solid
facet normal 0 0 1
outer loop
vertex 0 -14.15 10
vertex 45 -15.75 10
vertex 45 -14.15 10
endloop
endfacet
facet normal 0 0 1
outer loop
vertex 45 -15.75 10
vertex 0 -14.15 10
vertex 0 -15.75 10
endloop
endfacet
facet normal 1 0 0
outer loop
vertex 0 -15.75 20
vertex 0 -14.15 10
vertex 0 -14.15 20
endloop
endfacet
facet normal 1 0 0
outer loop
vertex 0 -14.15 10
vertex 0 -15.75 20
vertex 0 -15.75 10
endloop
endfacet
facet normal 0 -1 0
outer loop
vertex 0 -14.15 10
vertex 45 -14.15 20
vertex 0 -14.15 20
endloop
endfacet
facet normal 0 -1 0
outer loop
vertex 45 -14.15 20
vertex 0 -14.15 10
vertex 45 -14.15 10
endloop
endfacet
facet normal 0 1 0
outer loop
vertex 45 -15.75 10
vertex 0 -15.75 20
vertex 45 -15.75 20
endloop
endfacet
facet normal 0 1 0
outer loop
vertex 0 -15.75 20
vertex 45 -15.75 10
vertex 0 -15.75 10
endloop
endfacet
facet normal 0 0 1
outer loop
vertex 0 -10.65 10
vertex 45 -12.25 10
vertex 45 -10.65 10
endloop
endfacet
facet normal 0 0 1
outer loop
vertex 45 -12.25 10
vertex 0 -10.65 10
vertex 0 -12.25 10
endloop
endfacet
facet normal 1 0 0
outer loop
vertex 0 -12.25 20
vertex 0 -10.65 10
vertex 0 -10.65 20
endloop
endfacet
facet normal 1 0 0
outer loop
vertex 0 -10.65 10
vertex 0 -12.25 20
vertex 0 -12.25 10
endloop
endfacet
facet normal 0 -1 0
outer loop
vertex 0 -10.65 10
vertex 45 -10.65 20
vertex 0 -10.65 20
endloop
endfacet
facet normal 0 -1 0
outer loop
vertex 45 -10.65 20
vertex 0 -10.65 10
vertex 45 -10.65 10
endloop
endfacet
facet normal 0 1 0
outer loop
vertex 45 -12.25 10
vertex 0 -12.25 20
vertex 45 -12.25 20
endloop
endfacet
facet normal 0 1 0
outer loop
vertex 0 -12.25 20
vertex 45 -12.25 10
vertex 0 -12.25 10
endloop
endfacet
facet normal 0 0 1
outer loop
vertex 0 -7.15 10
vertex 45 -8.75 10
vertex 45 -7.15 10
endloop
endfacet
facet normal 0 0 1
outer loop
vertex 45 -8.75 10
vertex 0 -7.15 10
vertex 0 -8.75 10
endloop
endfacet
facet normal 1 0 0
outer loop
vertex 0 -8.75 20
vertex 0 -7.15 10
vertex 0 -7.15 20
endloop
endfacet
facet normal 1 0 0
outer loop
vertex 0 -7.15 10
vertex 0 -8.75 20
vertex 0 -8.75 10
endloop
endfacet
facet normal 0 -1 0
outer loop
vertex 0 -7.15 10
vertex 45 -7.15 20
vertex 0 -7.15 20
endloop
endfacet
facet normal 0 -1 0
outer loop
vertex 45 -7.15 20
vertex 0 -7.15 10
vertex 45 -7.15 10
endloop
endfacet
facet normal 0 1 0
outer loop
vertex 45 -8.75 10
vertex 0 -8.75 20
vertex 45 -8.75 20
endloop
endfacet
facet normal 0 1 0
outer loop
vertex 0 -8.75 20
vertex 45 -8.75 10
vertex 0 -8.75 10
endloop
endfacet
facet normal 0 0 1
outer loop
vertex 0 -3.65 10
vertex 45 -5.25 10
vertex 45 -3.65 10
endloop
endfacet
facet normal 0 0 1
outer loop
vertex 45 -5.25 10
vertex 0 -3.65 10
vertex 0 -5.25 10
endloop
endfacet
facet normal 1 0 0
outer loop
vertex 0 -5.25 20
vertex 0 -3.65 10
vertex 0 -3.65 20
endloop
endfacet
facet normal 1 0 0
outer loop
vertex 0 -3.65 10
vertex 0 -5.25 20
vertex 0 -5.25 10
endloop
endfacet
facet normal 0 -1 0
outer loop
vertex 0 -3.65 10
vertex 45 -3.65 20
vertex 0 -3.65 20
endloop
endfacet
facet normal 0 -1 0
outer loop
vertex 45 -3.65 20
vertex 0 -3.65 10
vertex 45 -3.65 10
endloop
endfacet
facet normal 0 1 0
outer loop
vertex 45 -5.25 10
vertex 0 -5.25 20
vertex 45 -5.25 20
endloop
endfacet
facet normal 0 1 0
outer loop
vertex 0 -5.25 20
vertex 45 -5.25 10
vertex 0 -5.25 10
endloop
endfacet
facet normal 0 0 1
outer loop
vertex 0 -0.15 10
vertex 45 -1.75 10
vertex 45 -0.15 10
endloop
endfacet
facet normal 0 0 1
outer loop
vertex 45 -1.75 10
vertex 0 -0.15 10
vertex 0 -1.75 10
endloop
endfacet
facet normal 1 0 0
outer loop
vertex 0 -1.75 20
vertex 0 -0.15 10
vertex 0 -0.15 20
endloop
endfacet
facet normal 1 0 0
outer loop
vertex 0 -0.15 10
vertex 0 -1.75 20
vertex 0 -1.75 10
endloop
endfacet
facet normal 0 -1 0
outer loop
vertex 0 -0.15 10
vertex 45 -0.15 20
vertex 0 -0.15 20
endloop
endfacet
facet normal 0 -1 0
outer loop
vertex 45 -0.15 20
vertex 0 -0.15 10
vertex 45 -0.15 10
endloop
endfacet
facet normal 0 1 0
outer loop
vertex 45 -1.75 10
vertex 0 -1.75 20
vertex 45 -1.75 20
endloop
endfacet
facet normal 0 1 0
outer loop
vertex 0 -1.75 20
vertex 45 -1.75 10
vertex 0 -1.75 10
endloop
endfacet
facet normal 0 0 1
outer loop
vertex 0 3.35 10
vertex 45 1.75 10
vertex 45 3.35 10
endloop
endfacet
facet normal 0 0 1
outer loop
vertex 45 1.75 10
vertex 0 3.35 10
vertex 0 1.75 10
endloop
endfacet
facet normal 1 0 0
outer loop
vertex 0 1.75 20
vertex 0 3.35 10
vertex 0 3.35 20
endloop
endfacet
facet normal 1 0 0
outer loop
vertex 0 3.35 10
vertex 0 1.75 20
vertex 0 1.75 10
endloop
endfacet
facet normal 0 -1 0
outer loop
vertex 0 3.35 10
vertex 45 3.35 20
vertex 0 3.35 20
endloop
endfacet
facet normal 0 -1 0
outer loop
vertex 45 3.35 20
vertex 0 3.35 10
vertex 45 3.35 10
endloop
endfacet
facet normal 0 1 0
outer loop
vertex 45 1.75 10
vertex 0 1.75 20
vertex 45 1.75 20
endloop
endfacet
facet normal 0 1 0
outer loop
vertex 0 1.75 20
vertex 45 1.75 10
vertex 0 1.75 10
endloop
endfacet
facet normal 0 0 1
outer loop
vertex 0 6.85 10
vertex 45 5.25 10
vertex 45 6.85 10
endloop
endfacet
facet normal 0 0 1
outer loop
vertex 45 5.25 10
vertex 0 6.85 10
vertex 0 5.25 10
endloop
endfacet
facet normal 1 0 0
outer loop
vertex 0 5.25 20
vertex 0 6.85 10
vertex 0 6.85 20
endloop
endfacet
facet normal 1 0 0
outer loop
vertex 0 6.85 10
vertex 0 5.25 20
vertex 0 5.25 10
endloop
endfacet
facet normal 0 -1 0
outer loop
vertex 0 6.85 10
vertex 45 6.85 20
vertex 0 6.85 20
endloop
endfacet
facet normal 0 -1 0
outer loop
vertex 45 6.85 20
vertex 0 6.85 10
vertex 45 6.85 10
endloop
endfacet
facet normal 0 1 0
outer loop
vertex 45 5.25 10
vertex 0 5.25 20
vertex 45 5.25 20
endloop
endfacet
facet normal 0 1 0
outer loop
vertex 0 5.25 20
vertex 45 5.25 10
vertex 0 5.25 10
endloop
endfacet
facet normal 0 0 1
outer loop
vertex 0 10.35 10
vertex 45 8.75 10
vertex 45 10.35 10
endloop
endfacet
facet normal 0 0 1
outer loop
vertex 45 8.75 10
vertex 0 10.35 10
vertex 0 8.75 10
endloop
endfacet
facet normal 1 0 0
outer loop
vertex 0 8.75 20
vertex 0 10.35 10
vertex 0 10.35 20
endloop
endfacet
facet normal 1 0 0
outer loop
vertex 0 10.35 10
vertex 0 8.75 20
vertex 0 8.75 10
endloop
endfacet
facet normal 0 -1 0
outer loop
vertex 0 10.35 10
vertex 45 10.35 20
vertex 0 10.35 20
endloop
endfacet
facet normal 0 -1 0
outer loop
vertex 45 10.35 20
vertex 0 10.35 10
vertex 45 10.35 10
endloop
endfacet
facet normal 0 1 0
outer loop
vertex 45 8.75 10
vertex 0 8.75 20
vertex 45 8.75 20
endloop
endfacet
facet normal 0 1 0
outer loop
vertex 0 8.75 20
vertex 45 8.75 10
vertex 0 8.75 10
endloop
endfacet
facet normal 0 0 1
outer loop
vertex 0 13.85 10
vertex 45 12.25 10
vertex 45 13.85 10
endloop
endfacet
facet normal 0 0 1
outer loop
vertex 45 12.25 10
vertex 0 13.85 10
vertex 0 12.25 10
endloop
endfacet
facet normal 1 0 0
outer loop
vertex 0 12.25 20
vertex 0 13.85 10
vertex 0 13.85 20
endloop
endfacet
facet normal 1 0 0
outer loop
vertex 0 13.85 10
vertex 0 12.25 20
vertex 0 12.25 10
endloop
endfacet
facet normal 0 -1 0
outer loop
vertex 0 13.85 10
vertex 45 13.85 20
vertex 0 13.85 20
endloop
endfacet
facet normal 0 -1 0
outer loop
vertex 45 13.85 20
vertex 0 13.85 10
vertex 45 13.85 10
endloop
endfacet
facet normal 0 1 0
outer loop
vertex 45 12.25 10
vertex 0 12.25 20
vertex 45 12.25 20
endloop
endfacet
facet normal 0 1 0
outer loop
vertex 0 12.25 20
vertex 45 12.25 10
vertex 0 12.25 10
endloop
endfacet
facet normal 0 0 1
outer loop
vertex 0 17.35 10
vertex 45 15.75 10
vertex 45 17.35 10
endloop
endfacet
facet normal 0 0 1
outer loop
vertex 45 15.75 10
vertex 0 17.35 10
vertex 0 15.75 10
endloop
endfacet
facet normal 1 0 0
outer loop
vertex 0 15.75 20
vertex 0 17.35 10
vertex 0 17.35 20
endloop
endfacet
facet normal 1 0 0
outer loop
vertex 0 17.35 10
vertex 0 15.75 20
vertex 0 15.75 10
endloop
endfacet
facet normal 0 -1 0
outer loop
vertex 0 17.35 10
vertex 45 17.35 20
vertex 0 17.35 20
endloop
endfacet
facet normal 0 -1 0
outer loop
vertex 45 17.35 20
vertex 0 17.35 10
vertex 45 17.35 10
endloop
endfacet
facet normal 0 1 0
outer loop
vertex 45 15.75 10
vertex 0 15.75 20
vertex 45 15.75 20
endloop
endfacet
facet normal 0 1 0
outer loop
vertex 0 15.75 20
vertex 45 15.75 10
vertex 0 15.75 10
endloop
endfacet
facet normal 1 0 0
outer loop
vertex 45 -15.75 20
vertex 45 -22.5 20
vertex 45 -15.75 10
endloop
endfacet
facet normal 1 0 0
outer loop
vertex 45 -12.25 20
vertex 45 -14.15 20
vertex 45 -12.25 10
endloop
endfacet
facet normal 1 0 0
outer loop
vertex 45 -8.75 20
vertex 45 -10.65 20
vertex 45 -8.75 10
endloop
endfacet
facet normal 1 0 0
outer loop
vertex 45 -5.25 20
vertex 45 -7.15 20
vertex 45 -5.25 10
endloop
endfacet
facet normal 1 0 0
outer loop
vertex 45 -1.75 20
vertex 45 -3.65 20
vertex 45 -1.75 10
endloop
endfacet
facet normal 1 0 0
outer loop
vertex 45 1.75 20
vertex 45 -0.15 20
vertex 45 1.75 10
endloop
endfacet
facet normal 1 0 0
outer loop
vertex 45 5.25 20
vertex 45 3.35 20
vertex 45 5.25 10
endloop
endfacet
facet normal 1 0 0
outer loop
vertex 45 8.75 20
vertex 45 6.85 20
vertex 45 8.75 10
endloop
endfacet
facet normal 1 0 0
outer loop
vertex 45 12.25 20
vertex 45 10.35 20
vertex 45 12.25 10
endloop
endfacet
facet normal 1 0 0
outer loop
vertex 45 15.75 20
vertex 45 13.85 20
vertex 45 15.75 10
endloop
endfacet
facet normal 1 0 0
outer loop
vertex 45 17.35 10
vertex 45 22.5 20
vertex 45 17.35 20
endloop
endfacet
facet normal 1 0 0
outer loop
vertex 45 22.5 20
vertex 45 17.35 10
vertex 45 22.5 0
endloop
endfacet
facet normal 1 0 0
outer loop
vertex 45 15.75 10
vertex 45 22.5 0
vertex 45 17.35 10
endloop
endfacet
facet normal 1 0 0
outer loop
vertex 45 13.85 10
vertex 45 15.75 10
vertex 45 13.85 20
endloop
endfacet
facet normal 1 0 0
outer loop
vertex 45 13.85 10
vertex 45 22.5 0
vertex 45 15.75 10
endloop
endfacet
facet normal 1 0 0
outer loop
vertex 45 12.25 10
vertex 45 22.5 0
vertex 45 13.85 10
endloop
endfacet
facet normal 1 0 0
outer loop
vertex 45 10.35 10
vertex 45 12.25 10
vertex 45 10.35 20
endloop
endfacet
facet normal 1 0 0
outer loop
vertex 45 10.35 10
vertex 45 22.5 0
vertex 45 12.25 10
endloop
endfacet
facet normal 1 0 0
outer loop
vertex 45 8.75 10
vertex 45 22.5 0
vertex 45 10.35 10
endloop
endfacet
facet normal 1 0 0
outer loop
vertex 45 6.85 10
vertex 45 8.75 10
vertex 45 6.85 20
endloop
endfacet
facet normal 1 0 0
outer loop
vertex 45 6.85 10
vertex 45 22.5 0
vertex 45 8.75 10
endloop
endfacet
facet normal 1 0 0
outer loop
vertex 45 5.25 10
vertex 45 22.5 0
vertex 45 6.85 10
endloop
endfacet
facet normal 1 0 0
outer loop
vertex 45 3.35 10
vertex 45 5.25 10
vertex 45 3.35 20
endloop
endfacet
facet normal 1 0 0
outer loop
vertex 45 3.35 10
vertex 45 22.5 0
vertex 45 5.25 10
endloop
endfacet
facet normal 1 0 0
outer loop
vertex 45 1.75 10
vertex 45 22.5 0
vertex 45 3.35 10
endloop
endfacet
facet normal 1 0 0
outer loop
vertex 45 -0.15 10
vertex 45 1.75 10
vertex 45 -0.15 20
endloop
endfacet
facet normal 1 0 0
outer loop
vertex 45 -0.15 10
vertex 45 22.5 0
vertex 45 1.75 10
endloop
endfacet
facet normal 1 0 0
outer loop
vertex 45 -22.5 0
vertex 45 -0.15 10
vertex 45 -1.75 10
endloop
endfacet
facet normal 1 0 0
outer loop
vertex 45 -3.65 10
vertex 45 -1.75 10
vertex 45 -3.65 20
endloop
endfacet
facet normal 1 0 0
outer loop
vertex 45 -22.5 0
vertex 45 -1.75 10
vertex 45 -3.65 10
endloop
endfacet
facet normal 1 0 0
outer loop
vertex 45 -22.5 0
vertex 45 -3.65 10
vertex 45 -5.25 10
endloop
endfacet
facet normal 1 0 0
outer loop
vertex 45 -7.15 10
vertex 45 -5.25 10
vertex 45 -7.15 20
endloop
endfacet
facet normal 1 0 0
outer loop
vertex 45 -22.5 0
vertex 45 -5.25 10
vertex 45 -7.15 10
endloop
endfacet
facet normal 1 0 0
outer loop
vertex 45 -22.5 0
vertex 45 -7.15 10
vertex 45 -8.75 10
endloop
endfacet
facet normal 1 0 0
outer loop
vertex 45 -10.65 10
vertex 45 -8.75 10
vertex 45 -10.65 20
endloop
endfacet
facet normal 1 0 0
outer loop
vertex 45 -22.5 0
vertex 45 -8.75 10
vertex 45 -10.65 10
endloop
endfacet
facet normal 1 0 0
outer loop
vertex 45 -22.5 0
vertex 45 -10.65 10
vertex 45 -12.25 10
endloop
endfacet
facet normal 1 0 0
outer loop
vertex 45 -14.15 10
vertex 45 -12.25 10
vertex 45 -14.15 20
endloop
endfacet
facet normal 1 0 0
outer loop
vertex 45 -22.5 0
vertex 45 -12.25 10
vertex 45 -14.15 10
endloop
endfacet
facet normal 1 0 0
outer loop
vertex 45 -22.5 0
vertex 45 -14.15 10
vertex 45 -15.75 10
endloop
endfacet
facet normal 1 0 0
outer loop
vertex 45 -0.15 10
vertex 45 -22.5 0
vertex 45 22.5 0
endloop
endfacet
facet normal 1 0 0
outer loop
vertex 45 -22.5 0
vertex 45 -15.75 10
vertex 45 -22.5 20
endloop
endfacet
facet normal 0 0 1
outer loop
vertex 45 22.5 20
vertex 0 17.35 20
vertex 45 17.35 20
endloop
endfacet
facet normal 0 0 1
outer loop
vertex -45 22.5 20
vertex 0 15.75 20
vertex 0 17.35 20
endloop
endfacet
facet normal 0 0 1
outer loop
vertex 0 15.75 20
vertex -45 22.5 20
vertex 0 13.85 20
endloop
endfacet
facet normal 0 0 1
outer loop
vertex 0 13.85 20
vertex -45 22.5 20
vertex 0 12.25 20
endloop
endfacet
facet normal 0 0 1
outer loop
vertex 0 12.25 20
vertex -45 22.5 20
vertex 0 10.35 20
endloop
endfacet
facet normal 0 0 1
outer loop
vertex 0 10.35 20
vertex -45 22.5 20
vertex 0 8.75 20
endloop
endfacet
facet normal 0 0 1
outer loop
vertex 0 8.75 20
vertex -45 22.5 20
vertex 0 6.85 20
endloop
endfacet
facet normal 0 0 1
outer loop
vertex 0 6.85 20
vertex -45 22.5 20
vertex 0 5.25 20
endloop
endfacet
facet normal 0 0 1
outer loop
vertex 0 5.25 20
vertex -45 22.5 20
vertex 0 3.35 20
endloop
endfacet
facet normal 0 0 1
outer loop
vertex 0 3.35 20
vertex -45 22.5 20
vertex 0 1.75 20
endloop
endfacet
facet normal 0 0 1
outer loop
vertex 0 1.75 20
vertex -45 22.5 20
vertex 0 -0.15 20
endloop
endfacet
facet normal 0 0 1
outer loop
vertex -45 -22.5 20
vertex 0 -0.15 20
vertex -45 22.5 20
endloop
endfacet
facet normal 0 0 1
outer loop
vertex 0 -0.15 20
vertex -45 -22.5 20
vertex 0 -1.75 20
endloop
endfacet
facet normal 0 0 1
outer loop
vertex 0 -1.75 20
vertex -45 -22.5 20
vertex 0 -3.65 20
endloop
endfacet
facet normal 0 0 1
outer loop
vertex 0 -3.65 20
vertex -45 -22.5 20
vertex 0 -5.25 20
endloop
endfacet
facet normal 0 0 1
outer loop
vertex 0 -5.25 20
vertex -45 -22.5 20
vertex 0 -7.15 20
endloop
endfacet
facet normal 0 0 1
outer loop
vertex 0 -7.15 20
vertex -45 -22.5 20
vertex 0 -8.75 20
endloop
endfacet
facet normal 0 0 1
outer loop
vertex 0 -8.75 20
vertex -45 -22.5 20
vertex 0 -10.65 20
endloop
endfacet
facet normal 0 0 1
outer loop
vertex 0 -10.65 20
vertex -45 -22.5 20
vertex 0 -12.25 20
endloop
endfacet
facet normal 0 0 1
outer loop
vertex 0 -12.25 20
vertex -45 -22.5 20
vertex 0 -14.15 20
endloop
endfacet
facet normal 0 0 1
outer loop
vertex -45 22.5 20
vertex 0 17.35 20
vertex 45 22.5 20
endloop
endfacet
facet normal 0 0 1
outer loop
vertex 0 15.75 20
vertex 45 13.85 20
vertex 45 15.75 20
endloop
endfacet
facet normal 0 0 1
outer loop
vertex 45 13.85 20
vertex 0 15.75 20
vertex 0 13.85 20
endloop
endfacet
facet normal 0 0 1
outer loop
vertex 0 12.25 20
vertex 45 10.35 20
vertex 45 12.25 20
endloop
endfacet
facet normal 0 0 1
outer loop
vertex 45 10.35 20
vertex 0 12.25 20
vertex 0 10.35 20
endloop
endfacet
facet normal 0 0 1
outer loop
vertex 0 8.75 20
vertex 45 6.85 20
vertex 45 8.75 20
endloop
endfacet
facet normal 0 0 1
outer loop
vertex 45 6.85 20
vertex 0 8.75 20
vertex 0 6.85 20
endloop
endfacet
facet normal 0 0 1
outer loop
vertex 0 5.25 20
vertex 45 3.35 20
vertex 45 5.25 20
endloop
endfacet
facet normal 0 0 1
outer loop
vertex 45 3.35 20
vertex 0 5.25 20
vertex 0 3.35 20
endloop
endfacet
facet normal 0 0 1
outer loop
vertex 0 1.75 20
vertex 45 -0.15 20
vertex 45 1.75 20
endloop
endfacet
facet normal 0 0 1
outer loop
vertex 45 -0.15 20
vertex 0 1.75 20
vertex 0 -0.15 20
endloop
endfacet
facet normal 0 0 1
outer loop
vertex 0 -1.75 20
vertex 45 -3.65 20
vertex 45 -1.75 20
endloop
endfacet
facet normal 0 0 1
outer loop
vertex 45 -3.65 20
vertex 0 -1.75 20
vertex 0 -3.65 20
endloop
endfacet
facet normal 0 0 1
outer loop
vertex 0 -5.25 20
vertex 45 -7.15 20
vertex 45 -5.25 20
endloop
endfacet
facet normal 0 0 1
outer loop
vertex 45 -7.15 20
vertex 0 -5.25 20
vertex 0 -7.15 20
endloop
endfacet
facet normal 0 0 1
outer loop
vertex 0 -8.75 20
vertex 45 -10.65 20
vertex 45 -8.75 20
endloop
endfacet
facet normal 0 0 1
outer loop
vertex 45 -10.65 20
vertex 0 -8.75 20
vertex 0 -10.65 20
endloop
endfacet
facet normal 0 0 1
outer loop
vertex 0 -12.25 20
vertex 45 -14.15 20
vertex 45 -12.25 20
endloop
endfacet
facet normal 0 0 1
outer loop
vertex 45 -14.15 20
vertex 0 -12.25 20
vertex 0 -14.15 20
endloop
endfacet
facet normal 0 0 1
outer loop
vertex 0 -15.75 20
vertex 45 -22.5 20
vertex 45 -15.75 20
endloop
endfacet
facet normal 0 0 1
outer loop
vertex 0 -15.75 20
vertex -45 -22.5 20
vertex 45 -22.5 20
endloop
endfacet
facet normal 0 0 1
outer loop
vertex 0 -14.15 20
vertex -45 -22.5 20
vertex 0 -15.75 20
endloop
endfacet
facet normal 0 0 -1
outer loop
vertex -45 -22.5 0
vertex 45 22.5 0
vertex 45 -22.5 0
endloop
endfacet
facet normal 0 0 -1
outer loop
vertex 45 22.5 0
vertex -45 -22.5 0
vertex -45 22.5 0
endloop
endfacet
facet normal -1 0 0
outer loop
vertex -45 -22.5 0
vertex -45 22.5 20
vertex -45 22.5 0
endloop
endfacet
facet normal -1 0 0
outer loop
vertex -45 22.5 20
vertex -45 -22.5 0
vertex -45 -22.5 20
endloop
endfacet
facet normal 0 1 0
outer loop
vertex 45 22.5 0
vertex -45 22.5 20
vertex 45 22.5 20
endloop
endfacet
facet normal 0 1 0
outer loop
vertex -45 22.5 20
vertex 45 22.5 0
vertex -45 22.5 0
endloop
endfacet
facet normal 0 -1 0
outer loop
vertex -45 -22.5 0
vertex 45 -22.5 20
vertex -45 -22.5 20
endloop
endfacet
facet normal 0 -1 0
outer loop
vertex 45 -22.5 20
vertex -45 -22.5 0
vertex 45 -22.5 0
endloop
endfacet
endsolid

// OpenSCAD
// Microscope slide drying rack
// Print orientation: base block on XY plane, slots open upward (+Z)

// ---------------- Parameters ----------------
block_len    = 90;    // block length along X (mm)
block_wid    = 45;    // block width along Y (mm)
block_h      = 20;    // block height along Z (mm)

slot_count   = 10;    // number of slide slots
slot_len     = 77;    // slot length along X (mm)
slot_w       = 1.6;   // slot width along Y (mm)
slot_depth   = 10;    // slot depth from top face (mm)
slot_pitch   = 3.5;   // centre-to-centre slot spacing along Y (mm)

eps          = 0.5;   // overcut so cutting faces are not coplanar (mm)

$fn = 64;

// ---------------- Derived ----------------
first_y = -(slot_count - 1) * slot_pitch / 2;   // Y of first slot (group centred)

// ---------------- Model ----------------
difference() {
    // Base block, centred in X and Y, resting on z = 0
    translate([-block_len / 2, -block_wid / 2, 0])
        cube([block_len, block_wid, block_h]);

    // Parallel slots running along X, open at the top
    for (i = [0 : slot_count - 1]) {
        translate([0, first_y + i * slot_pitch, block_h - slot_depth])
            cube([slot_len, slot_w, slot_depth + eps]);
    }
}
